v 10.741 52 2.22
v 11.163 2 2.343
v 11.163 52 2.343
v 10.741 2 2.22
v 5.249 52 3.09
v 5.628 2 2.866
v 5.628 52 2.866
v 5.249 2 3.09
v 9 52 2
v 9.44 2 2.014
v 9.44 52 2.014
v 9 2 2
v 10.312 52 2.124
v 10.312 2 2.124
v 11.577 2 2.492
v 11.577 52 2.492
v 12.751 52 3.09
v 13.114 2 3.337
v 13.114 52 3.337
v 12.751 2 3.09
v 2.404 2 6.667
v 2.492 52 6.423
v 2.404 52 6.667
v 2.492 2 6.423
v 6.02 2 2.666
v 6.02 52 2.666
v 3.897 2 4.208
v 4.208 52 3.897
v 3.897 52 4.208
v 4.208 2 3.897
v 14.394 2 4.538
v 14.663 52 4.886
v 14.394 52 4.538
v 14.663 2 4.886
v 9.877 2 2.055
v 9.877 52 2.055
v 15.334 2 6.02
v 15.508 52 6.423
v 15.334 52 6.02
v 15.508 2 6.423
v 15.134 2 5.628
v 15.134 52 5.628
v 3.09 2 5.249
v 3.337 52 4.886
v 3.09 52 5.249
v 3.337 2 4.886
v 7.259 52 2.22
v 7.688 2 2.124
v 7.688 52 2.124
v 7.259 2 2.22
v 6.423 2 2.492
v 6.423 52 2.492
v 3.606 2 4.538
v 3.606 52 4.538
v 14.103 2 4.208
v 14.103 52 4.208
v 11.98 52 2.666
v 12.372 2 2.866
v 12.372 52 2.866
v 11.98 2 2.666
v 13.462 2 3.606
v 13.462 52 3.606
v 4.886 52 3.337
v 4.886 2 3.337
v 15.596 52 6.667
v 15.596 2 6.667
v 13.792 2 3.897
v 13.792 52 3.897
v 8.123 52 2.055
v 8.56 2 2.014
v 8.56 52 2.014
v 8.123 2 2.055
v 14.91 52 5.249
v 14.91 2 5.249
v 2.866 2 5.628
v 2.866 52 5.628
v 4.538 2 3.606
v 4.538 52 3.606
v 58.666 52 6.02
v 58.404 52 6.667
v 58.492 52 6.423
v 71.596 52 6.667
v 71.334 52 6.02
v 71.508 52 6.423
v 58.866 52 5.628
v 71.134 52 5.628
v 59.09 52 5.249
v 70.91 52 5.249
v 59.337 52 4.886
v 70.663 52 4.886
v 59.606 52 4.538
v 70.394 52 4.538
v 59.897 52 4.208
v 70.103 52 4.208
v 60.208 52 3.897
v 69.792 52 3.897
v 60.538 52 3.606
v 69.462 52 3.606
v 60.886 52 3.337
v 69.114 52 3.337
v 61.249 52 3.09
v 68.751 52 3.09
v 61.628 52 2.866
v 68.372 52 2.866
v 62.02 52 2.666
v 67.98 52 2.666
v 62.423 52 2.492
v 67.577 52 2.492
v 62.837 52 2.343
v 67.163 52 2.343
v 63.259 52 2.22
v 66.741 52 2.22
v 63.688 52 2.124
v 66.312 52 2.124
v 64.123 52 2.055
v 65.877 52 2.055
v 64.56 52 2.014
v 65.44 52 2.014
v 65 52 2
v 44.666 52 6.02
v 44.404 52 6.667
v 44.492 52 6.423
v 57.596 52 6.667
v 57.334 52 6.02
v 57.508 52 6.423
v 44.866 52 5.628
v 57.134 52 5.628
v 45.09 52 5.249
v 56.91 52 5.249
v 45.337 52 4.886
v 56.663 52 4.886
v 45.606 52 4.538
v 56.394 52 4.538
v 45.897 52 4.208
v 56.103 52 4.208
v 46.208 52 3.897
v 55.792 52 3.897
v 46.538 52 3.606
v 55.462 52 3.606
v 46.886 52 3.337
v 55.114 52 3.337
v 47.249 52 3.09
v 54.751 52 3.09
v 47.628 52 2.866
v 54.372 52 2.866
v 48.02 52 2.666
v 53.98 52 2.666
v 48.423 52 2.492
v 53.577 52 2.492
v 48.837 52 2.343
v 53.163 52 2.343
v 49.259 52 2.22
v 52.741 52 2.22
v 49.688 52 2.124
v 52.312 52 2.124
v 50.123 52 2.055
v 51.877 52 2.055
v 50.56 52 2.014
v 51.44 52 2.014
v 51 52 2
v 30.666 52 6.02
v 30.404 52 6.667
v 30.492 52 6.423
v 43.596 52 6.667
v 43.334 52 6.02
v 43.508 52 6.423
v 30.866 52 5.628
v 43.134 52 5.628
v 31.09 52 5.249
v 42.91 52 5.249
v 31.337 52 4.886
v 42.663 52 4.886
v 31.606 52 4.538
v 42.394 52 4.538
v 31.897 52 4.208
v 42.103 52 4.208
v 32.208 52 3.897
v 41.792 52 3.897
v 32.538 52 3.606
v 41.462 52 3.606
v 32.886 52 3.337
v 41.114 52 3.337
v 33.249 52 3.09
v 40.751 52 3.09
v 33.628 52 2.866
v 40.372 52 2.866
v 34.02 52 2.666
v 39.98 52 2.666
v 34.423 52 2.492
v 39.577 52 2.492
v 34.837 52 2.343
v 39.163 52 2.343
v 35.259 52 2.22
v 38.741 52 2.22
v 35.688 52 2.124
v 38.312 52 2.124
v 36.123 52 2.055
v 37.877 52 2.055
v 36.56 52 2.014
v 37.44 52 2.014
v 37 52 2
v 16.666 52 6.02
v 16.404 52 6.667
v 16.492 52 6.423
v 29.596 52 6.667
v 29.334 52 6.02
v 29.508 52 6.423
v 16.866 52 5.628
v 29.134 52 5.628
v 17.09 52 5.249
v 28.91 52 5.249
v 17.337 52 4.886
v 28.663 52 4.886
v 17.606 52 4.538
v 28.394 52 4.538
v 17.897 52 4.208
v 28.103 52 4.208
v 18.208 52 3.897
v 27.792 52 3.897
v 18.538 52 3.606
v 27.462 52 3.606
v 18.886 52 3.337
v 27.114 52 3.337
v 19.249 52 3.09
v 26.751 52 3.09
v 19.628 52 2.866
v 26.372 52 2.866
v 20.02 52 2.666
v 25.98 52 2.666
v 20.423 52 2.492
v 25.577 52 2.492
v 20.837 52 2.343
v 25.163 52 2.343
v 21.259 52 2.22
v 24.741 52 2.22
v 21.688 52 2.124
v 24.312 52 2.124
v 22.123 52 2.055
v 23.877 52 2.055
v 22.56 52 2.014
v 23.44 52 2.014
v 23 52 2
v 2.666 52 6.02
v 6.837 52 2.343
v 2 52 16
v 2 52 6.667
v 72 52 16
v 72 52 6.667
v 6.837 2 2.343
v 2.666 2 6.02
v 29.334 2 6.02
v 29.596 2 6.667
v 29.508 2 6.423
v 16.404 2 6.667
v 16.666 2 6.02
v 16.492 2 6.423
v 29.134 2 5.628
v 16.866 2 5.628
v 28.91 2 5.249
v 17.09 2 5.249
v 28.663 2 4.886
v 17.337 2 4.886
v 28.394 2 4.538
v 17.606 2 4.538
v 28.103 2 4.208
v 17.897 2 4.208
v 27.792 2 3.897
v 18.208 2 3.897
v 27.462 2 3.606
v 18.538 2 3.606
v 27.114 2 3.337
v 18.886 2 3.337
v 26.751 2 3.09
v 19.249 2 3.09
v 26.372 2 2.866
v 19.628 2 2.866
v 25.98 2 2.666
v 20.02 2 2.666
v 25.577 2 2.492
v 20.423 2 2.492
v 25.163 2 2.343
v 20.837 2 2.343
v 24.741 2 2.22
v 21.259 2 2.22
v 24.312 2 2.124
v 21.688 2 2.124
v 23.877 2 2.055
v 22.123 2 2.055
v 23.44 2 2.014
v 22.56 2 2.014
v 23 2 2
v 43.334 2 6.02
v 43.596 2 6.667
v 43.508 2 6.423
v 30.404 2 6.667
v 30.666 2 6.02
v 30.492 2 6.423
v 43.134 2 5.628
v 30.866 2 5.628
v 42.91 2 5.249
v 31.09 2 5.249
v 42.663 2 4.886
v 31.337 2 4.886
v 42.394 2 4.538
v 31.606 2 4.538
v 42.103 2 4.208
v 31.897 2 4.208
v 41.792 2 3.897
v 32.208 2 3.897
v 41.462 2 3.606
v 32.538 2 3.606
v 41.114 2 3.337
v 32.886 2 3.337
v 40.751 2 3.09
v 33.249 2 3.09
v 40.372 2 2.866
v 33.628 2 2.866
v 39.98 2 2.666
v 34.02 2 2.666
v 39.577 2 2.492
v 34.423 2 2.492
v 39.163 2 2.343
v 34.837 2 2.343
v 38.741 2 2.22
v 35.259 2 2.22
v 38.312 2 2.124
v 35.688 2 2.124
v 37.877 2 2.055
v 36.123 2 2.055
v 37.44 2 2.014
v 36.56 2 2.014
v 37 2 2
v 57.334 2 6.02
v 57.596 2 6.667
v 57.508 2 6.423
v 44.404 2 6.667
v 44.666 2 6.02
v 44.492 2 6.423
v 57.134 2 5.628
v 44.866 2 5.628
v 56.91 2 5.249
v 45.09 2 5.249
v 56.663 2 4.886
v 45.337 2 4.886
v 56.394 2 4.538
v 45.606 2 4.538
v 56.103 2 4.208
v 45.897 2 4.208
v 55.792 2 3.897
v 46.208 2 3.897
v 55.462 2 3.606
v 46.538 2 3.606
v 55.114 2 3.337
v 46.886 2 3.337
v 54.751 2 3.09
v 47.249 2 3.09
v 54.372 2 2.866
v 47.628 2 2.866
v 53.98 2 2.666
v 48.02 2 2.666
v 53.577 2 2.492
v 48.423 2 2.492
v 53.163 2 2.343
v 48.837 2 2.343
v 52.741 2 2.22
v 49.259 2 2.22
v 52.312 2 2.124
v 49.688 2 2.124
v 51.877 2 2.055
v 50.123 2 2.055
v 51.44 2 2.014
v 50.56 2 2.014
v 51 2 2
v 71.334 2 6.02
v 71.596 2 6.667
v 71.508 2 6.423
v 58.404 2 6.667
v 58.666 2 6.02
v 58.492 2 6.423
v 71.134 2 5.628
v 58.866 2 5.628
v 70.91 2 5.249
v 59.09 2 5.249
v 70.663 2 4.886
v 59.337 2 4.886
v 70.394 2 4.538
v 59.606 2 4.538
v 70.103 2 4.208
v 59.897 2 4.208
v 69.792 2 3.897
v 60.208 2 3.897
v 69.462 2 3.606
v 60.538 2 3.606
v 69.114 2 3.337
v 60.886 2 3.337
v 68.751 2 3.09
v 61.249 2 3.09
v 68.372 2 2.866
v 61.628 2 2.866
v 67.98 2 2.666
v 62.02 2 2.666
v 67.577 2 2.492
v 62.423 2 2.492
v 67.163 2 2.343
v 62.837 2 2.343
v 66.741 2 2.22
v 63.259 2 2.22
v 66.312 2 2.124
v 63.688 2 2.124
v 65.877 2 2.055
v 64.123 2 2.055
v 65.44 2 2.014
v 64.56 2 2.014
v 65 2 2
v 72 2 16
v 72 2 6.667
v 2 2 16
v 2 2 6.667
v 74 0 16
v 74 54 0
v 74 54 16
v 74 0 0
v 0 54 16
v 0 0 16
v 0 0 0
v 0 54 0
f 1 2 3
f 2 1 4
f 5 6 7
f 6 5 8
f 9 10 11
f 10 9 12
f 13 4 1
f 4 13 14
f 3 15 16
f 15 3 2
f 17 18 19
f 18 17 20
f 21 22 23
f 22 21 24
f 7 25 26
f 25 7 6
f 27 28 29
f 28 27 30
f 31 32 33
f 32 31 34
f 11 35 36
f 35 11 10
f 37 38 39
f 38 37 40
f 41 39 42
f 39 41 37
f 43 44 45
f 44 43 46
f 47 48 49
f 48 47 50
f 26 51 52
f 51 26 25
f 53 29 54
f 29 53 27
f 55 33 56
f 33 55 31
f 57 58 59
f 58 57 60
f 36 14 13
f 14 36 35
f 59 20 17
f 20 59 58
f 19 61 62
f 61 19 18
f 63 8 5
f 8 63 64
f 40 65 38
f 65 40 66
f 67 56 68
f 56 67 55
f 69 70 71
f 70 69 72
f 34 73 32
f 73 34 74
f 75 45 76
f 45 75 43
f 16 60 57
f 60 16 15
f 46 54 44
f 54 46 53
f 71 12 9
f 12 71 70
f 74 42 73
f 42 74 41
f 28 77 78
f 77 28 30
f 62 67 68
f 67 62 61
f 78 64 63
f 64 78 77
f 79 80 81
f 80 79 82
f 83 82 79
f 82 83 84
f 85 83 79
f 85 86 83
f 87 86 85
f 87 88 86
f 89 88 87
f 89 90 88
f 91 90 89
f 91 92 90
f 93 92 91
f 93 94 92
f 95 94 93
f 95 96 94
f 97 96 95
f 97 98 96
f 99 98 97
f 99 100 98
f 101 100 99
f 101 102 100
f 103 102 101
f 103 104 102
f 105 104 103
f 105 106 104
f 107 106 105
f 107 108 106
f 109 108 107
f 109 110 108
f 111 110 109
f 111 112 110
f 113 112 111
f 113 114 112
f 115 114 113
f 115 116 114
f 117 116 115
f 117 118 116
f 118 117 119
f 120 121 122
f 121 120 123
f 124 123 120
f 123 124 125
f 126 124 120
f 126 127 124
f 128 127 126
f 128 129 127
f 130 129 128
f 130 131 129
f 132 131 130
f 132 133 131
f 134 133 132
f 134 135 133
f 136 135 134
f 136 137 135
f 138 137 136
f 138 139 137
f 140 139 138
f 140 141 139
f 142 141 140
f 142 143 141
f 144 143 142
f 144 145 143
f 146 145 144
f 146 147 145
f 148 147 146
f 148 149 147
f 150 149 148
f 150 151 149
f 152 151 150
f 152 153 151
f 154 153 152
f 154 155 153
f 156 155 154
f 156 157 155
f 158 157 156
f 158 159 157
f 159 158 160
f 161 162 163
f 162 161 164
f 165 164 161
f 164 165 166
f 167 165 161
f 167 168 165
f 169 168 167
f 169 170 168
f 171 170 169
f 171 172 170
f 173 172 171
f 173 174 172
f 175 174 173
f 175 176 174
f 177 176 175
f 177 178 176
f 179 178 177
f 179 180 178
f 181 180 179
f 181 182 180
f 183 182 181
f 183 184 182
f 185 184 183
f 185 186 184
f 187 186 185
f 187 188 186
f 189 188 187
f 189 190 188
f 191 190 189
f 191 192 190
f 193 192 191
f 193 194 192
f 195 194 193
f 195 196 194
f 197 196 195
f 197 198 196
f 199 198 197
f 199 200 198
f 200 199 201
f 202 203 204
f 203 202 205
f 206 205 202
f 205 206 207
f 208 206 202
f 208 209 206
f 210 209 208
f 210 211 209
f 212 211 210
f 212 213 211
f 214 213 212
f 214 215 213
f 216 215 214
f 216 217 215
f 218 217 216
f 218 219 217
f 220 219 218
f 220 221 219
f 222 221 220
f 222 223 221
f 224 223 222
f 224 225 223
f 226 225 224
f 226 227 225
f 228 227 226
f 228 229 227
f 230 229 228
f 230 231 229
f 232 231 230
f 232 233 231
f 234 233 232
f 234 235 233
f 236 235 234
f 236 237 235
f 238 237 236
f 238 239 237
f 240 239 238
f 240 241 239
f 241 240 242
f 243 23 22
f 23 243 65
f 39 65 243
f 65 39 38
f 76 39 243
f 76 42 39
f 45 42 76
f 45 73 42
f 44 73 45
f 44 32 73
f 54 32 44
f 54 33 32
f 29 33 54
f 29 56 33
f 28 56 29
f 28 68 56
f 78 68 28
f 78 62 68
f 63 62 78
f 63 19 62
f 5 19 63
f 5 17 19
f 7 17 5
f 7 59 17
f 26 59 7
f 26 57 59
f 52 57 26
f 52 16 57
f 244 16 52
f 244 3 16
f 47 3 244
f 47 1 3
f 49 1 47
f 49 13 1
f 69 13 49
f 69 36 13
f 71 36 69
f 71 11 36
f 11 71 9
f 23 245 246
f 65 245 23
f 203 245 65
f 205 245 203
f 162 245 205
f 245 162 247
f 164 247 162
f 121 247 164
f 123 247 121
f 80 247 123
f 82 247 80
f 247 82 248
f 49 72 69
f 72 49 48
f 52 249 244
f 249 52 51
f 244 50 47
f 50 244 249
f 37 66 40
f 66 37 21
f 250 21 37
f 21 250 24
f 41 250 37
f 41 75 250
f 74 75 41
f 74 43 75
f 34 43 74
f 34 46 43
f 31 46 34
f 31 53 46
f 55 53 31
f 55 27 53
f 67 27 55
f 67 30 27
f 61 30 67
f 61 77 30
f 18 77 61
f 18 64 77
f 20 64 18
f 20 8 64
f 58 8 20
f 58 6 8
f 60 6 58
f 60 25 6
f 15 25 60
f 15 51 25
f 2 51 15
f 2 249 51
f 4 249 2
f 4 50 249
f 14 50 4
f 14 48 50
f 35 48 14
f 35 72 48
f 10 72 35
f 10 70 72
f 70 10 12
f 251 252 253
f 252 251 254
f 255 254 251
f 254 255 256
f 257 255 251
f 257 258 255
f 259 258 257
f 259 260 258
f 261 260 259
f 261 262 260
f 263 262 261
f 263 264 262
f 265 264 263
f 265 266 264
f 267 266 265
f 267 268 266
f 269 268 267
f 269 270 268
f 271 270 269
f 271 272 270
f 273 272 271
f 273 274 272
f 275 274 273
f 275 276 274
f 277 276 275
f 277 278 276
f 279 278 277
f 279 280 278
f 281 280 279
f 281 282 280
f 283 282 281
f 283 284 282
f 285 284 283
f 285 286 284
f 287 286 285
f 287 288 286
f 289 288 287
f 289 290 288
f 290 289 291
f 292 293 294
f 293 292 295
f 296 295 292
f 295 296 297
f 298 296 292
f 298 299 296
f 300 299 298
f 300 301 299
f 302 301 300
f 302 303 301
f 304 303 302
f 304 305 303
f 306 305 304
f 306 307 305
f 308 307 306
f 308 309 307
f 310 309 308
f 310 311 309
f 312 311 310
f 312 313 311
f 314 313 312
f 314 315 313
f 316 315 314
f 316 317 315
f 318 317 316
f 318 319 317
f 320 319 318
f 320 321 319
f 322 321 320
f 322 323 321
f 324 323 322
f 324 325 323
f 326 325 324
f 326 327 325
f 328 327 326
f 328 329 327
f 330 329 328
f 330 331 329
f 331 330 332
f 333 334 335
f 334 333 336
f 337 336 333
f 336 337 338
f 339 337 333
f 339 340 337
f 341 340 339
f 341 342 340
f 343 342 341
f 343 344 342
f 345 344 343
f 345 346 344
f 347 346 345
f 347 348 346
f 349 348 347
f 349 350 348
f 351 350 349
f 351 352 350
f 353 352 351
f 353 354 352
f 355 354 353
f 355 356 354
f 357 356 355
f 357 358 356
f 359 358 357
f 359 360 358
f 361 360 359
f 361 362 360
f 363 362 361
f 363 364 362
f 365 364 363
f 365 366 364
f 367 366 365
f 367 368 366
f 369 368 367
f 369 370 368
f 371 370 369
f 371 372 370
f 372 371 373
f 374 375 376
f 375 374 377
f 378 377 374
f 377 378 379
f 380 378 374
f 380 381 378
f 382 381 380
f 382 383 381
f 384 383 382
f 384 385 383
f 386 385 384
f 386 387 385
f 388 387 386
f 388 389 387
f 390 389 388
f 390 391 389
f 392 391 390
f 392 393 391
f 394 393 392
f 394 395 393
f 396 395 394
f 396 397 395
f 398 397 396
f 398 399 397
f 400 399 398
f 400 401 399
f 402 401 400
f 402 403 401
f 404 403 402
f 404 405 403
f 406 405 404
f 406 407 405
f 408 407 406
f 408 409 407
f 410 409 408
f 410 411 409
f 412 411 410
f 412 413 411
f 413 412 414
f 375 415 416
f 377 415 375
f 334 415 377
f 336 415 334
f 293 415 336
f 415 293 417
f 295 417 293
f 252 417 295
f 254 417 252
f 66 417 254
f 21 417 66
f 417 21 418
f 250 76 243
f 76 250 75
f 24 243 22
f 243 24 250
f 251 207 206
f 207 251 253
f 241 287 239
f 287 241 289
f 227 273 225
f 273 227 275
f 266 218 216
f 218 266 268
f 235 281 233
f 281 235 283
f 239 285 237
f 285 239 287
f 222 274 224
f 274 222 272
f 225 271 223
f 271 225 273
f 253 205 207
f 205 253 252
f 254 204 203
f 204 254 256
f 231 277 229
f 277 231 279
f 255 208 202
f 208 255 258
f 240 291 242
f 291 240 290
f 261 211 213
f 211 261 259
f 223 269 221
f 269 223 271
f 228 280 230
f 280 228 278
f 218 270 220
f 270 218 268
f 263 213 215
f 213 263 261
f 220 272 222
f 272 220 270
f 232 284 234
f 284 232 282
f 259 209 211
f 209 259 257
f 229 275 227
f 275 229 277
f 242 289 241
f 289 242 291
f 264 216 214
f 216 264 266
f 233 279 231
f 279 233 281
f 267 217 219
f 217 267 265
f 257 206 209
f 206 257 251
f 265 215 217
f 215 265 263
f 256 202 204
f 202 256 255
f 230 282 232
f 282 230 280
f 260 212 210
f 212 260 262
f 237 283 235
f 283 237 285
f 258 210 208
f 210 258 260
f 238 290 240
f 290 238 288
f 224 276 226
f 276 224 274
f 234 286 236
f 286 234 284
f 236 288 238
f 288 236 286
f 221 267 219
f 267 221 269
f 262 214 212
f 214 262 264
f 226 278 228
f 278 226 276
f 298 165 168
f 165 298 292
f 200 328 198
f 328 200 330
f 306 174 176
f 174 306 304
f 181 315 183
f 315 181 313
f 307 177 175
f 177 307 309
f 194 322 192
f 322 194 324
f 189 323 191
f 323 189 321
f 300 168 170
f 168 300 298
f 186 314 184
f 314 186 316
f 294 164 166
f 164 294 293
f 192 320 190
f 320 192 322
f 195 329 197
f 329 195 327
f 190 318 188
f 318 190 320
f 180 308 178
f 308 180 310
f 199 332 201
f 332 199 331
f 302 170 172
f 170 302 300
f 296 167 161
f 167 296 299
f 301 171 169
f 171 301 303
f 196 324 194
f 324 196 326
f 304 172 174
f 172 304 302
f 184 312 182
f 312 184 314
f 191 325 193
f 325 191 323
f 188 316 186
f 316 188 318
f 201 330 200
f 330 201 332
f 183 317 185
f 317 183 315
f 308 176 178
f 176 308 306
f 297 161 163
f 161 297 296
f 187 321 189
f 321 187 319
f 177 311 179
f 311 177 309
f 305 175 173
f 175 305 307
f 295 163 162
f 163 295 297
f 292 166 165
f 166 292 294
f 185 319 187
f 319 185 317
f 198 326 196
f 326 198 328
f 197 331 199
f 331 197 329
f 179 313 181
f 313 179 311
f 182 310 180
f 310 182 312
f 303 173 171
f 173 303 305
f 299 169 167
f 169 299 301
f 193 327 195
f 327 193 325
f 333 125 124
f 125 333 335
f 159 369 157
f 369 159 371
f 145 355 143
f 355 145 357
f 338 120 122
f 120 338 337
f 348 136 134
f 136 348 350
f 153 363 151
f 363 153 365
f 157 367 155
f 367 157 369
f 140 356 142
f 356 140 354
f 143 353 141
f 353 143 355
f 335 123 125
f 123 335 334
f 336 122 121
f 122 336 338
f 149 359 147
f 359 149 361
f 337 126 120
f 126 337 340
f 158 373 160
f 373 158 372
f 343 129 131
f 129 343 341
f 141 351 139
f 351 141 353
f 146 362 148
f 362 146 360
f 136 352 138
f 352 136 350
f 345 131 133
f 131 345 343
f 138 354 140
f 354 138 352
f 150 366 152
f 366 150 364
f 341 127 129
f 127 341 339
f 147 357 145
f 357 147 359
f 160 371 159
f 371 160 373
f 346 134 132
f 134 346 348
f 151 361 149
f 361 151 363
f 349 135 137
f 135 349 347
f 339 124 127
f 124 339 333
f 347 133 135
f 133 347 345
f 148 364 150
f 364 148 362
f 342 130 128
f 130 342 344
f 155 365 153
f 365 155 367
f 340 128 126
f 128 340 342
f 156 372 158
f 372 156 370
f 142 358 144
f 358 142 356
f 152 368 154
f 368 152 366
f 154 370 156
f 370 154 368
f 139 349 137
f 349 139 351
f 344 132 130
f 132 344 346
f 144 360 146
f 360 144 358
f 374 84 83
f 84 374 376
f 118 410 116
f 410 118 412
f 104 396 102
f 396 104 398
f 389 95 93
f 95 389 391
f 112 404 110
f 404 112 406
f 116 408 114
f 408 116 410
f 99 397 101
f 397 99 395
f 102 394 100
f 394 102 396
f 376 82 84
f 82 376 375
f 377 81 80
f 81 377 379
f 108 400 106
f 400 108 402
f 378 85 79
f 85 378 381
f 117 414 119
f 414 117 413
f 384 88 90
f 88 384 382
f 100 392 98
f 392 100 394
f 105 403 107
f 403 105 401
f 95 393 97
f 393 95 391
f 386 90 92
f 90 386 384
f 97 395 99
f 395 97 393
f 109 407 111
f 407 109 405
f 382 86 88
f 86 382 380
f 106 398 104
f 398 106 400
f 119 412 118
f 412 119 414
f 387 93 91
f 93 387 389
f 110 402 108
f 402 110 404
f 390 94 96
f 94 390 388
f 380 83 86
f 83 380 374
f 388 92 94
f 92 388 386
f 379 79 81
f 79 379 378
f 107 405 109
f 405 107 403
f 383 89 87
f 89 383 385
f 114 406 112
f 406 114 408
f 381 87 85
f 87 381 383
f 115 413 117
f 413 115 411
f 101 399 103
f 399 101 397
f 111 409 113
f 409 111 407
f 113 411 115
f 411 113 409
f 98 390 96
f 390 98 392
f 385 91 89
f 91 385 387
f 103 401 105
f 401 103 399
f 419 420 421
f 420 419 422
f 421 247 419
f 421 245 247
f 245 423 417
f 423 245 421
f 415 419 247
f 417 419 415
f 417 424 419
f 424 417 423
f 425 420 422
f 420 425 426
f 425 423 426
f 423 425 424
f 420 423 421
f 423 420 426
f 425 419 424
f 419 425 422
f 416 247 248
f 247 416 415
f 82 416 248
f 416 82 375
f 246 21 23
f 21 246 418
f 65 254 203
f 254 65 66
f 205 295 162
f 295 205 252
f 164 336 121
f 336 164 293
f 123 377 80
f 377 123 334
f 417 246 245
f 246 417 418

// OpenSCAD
thickness = 2;
batteries = 5;
brackets = true; // [true, false]

type = "AA"; // [AA,AAA,AAAA,C,D,custom]

custom_diameter = 14; //mm
custom_length = 50; //mm

if (type == "custom") batteryTray(custom_diameter, custom_length);
else if (type == "AA") batteryTray(14,50);
else if (type == "AAA") batteryTray(10,44);
else if (type == "AAAA") batteryTray(8.3,42.5);
else if (type == "C") batteryTray(26,50);
else if (type == "D") batteryTray(34,61);
else batteryTray(14,50);

module batteryTray (diameter, length) {
	difference() {
	cube([diameter*batteries+2*thickness,length+2*thickness,diameter+thickness]);
		translate([thickness,thickness,thickness+diameter/3])
		cube([diameter*batteries,length,diameter*2]);
		if (brackets) {
			rotate ([90,0,0])
			translate([diameter/2+thickness,diameter/2+thickness,-length-thickness])
			for ( i = [0 : batteries-1] ) {
				translate([diameter*i,0,0])
				cylinder (h = length, r=diameter/2, center = false, $fn=100);
			}
		}
	}
}
